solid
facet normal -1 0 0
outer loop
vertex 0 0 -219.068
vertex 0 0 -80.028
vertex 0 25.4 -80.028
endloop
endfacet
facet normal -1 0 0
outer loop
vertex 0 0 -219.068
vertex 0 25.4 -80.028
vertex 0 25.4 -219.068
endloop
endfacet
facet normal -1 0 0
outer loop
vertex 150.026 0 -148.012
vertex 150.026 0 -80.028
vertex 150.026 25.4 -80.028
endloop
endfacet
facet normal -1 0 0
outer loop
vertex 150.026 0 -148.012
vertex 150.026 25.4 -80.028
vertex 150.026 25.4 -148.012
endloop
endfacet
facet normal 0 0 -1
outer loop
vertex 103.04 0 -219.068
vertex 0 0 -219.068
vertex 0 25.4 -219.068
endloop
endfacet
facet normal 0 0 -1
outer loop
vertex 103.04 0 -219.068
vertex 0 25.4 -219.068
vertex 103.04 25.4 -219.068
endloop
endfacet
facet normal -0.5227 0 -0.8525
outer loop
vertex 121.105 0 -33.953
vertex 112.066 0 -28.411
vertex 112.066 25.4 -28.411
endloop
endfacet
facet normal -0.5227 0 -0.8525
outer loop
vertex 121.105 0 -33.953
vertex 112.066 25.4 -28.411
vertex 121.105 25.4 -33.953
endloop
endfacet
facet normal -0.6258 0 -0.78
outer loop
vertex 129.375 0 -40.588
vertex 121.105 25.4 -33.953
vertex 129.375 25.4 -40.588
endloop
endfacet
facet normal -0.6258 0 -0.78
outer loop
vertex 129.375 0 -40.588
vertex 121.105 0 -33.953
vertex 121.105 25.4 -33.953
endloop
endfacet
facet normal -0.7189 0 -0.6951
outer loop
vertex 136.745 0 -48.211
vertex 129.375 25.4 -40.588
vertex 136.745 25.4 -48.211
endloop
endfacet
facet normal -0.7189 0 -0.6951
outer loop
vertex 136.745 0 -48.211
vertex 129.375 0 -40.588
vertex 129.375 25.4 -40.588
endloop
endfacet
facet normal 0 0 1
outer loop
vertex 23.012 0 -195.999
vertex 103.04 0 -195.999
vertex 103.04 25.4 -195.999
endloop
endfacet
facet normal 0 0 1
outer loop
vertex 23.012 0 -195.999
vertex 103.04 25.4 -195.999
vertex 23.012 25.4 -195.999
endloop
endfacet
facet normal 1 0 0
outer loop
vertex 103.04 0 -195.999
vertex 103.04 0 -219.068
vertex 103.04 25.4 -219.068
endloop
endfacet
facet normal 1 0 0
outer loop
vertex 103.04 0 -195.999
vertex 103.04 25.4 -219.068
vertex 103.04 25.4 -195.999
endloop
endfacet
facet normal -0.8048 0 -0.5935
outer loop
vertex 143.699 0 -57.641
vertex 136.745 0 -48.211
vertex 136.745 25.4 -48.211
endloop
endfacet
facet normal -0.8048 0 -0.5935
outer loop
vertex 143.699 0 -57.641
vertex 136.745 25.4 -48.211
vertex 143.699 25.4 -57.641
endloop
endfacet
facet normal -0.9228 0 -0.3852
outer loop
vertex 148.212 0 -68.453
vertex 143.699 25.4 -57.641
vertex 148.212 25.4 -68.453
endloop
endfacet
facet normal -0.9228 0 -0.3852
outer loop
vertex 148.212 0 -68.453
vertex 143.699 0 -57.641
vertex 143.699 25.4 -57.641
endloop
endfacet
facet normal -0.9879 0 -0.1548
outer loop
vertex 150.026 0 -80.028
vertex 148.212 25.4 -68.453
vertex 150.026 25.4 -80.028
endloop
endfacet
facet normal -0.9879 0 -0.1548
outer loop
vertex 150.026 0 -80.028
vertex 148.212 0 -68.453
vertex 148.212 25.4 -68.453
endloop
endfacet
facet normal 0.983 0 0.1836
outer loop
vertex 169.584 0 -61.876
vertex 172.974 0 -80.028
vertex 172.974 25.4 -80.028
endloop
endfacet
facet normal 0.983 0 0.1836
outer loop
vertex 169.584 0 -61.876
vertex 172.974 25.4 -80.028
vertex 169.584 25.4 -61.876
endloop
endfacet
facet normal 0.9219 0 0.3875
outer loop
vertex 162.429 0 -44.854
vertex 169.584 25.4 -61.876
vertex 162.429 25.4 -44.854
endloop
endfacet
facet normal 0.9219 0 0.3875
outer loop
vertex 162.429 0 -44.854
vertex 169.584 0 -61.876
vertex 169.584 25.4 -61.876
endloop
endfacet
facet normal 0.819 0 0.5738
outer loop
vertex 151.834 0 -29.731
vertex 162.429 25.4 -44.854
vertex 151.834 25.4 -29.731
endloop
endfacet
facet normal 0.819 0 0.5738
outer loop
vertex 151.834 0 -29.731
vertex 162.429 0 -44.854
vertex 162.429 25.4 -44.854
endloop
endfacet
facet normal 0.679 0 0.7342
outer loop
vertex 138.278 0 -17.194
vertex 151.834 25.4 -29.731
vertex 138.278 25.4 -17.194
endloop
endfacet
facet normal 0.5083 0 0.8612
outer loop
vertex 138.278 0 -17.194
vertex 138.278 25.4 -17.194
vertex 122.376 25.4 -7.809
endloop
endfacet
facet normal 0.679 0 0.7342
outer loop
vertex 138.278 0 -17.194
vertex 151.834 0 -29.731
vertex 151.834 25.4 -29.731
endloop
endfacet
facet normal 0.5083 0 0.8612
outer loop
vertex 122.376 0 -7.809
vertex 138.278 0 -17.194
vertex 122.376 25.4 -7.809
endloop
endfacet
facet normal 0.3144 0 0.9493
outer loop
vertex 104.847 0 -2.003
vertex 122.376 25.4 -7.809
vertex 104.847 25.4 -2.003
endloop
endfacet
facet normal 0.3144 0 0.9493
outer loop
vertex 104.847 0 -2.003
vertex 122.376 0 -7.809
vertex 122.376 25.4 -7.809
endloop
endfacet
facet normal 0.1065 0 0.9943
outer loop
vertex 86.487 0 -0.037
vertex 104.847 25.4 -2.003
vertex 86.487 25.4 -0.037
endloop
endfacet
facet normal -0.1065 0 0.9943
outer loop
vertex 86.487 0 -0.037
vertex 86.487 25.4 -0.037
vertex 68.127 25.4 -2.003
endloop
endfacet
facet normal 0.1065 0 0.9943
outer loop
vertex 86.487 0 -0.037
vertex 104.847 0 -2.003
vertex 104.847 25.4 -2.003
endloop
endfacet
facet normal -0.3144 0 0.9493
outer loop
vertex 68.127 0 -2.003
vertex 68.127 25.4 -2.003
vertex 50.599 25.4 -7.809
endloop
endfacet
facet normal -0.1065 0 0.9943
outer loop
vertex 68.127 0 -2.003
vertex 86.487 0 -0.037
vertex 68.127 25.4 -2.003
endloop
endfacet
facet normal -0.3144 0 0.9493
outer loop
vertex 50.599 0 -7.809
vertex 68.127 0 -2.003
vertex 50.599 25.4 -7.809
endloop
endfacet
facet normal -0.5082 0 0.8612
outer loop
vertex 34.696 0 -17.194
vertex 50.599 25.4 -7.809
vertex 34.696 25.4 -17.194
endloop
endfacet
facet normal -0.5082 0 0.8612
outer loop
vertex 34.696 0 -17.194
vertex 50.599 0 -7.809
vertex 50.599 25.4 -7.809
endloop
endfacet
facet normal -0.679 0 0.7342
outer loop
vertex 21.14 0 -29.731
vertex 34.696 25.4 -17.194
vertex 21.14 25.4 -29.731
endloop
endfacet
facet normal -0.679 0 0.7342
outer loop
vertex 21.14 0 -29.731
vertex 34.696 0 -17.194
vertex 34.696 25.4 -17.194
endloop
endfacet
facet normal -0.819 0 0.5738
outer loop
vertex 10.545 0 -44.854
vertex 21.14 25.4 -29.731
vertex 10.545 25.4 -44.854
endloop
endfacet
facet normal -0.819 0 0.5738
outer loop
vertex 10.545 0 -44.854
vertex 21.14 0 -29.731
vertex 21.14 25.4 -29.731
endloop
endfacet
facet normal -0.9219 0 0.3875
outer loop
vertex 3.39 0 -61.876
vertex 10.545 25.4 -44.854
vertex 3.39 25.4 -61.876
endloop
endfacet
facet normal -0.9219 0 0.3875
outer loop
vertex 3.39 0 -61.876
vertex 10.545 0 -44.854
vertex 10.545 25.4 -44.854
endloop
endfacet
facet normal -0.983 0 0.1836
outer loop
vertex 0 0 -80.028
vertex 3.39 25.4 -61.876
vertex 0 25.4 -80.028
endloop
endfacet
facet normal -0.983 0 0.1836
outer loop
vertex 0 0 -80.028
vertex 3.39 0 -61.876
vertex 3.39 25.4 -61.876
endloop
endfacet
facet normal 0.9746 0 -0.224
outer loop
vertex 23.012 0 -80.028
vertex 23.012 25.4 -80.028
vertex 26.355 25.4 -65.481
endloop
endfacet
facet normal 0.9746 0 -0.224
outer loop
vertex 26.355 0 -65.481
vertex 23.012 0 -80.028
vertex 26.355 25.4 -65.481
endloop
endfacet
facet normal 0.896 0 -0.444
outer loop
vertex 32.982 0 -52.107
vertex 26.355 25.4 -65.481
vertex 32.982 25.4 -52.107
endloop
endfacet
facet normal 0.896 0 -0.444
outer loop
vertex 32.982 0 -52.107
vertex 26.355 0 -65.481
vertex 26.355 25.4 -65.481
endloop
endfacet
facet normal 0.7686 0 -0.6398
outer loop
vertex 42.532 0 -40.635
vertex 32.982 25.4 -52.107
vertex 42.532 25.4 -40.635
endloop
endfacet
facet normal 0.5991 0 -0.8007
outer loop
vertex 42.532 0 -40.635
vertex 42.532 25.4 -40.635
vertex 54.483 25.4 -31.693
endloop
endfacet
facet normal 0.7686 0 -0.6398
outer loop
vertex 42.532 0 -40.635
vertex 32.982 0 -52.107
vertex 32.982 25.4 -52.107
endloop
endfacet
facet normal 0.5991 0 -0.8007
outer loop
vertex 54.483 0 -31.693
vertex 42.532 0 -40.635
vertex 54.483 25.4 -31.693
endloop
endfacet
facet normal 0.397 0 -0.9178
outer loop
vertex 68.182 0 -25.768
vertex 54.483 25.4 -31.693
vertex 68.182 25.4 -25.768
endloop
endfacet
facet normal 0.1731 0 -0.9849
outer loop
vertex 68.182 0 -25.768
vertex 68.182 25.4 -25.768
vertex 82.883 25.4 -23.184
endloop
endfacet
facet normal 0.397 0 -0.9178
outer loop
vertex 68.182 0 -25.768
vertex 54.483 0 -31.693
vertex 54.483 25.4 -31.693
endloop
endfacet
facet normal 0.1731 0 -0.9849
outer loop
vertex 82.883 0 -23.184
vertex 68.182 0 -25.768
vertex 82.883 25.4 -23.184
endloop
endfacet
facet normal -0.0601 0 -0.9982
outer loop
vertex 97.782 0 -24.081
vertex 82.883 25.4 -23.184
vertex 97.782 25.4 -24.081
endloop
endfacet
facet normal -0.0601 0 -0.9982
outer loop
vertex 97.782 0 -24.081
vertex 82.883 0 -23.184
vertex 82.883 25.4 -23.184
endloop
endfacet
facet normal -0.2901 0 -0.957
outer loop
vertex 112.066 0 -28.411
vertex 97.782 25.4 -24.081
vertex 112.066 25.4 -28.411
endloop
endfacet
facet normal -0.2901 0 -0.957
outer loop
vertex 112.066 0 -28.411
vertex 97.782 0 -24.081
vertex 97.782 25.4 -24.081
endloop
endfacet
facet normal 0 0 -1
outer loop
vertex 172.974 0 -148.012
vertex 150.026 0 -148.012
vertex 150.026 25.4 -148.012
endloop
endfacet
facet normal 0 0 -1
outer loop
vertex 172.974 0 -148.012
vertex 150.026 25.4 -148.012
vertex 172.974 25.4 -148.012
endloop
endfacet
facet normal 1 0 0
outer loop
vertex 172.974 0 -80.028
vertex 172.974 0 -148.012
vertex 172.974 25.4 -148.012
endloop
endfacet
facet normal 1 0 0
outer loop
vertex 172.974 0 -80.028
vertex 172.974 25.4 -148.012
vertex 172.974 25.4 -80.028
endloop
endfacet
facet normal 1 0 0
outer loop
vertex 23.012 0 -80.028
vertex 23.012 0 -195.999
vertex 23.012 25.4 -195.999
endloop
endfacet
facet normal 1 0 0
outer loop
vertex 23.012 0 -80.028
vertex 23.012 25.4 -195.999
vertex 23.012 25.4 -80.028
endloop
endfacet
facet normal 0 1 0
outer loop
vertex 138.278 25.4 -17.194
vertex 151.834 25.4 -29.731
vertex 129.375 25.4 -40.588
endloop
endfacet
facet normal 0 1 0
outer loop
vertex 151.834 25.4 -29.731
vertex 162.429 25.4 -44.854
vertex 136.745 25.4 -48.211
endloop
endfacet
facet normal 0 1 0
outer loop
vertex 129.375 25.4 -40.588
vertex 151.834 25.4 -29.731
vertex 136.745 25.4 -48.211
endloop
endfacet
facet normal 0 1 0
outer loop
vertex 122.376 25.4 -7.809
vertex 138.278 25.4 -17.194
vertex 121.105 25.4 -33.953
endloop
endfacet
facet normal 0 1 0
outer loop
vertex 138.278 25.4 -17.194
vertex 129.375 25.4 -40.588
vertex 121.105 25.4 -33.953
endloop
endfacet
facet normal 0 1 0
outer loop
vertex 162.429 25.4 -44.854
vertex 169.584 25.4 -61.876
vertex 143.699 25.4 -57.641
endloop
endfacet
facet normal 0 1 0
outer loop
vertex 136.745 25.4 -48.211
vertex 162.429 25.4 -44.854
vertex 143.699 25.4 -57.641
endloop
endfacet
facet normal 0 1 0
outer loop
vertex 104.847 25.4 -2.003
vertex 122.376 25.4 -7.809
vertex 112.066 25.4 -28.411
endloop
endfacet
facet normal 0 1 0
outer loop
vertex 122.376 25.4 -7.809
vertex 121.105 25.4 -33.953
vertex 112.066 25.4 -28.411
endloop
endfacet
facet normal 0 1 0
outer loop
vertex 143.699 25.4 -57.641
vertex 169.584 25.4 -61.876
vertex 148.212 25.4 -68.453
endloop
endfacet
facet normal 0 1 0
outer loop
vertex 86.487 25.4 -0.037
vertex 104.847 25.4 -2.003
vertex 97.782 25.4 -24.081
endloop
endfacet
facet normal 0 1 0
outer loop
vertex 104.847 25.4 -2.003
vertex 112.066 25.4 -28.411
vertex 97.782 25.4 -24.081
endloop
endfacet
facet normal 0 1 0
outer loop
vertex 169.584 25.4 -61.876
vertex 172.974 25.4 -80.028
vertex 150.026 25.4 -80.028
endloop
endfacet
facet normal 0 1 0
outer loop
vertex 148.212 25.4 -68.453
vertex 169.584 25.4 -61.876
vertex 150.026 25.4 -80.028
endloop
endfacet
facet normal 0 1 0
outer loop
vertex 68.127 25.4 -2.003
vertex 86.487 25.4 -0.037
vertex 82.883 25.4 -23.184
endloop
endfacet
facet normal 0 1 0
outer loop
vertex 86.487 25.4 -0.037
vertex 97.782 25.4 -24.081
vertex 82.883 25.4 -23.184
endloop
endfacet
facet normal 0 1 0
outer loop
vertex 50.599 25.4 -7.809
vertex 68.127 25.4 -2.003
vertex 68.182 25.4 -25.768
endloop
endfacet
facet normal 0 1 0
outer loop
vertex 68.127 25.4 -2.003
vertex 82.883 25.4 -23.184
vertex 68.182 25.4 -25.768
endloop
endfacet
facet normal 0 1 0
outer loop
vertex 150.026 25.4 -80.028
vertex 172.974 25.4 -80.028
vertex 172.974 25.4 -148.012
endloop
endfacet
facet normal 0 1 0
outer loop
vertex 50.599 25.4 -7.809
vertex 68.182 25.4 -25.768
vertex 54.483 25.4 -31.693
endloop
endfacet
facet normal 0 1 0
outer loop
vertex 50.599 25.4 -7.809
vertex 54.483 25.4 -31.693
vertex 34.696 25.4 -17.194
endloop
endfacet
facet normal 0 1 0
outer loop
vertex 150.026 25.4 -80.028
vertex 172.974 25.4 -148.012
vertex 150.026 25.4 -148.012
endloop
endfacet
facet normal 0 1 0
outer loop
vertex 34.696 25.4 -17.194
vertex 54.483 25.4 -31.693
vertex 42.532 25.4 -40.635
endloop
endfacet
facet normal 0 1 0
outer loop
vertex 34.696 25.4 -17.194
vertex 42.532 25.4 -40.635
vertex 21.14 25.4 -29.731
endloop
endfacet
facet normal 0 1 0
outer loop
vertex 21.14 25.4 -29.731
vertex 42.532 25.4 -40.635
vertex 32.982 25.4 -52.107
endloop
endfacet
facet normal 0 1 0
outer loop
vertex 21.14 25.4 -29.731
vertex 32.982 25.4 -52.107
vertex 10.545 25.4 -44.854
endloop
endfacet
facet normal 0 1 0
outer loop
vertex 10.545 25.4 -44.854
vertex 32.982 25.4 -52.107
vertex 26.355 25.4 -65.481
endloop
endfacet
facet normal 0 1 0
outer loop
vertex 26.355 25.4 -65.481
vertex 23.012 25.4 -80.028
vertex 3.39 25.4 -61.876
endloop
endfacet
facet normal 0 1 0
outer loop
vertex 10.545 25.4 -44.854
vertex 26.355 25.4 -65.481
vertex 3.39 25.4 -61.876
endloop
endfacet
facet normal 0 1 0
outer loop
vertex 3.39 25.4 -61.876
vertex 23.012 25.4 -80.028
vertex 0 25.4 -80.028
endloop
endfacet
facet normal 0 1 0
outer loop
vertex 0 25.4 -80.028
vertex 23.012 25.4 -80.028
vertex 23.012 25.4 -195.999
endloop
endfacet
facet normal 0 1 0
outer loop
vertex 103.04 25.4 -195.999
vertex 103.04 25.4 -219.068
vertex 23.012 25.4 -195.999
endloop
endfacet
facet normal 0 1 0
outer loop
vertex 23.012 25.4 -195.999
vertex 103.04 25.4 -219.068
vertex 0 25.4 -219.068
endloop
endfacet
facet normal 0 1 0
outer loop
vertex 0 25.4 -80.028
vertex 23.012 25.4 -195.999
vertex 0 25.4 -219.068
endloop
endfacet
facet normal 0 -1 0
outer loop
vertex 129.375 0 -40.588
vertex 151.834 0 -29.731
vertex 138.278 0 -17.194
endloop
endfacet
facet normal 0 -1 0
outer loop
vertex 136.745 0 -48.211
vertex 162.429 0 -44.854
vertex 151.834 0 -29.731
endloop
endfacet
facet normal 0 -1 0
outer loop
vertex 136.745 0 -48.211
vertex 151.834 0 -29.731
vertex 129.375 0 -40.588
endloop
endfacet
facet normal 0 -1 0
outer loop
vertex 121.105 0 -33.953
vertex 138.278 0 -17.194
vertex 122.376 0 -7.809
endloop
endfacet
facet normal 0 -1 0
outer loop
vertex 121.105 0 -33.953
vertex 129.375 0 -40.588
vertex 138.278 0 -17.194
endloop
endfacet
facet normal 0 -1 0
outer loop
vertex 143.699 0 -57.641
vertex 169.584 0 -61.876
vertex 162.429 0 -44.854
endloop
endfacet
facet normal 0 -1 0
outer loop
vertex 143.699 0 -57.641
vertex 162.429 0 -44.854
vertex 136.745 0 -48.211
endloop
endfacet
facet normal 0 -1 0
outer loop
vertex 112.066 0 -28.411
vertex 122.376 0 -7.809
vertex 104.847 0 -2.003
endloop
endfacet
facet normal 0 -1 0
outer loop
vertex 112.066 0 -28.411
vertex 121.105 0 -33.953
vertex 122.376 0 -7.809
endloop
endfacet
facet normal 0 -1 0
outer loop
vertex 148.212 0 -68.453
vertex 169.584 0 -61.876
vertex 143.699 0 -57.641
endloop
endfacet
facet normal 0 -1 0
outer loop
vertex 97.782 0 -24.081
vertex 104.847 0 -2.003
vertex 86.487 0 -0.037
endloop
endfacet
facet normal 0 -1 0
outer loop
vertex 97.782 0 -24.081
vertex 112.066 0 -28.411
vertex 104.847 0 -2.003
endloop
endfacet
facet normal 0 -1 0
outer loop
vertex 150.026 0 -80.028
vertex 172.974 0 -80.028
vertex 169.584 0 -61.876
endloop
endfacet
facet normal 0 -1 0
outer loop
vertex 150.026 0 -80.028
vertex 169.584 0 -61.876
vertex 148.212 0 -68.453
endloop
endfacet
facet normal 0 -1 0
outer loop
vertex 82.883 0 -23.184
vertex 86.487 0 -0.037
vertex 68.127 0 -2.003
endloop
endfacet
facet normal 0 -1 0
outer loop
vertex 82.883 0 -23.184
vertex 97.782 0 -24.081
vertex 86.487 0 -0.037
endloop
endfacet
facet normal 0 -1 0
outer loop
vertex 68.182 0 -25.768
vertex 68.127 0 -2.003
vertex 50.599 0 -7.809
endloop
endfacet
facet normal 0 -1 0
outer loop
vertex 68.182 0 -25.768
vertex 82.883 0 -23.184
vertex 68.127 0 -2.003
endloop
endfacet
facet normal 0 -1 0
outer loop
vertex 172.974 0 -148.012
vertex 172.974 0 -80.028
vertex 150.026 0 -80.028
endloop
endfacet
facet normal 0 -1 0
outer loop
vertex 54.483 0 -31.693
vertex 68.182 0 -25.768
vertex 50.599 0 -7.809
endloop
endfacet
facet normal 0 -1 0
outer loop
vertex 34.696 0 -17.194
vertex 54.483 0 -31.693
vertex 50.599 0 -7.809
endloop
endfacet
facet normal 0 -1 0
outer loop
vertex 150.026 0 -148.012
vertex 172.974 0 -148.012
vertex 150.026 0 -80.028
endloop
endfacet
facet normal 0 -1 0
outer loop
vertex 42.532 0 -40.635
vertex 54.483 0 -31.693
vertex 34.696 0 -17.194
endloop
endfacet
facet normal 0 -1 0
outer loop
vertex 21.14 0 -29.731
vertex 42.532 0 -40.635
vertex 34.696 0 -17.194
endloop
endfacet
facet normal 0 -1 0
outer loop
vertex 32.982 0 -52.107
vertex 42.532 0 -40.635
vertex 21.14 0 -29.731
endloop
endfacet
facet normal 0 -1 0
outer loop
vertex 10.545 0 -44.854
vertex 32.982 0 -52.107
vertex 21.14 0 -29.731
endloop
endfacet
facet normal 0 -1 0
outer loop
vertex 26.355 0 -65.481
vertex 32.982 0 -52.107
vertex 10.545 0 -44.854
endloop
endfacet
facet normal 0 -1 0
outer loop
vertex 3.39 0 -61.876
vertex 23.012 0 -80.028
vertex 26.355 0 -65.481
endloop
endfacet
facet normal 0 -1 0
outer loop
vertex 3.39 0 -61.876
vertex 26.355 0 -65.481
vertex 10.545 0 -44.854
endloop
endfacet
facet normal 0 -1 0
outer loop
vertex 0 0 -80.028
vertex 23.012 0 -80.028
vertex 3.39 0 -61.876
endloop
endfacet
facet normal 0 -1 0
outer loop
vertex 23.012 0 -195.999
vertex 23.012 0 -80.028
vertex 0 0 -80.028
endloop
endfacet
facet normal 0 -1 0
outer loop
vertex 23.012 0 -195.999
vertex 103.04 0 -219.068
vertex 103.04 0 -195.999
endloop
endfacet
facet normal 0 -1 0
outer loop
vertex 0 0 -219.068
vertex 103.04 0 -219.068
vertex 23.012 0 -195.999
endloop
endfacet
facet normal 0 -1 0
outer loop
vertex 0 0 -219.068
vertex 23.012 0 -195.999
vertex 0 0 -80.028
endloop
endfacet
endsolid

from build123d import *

# Parameters (mm, degrees)
BOSS_EXTRUDE1_DEPTH     = 25.4
BOSS_EXTRUDE1_2_DEPTH   = 25.4
CUT_EXTRUDE1_DEPTH      = 281.867791968
CUT_EXTRUDE1_DEPTH_BACK = 281.867791968
SKETCH2_W               = 46.910236734
SKETCH2_H               = 46.937556504
CUT_EXTRUDE2_DEPTH      = 281.278275978
CUT_EXTRUDE2_DEPTH_BACK = 281.278275978


with BuildPart() as part:
    # Sketch1 → Boss-Extrude1 (new body)
    with BuildSketch(Plane(origin=(0, 0, 0), x_dir=(1, 0, 0), z_dir=(0, 1, 0))):
        with BuildLine():
            Line((0, 80.02759766), (0, 219.067642019))
            Line((0, 219.067642019), (103.040086398, 219.067642019))
            Line((103.040086398, 219.067642019), (103.040086398, 195.999460881))
            Line((103.040086398, 195.999460881), (23.011829096, 195.999460881))
            Line((23.011829096, 195.999460881), (23.011829096, 161.013213822))
            ThreePointArc((23.011829096, 161.013213822), (101.985495584, 126.901824422), (136.744902109, 48.211224327))
            ThreePointArc((136.744902109, 48.211224327), (146.280346481, 62.911008862), (150.026111113, 80.02759766))
            Line((150.026111113, 80.02759766), (150.026111113, 148.011746996))
            Line((150.026111113, 148.011746996), (172.974333949, 148.011746996))
            Line((172.974333949, 148.011746996), (172.974333949, 80.02759766))
            ThreePointArc((172.974333949, 80.02759766), (86.487166974, 0.037389651), (0, 80.02759766))
        make_face()
        with BuildLine():
            Line((23.011829096, 136.058182002), (23.011829096, 80.02759766))
            ThreePointArc((23.011829096, 80.02759766), (54.48283159, 31.69310754), (112.066438029, 28.410547154))
            ThreePointArc((112.066438029, 28.410547154), (90.841729512, 101.512108787), (23.011829096, 136.058182002))
        make_face(mode=Mode.SUBTRACT)
    extrude(amount=BOSS_EXTRUDE1_DEPTH)

    # Sketch3 → Cut-Extrude2 (cut, two sides: drawn at the far end of the back side and taken through both)
    with BuildSketch(Plane(origin=(0, 25.4, 0), x_dir=(1, 0, 0), z_dir=(0, 1, 0)).offset(-CUT_EXTRUDE2_DEPTH_BACK)):
        with BuildLine():
            Line((23.011829096, 161.013213822), (23.011829096, 136.058182002))
            ThreePointArc((23.011829096, 136.058182002), (90.841729512, 101.512108787), (112.066438029, 28.410547154))
            ThreePointArc((112.066438029, 28.410547154), (125.345033885, 37.140114863), (136.744902109, 48.211224327))
            ThreePointArc((136.744902109, 48.211224327), (101.985495584, 126.901824422), (23.011829096, 161.013213822))
        make_face()
    extrude(amount=CUT_EXTRUDE2_DEPTH + CUT_EXTRUDE2_DEPTH_BACK, mode=Mode.SUBTRACT)


with BuildPart() as body_2:
    # Sketch1 → Boss-Extrude1 2 (new body)
    with BuildSketch(Plane(origin=(0, 0, 0), x_dir=(1, 0, 0), z_dir=(0, 1, 0))):
        Polygon((173.927929859, 172.130085515), (150.026111113, 172.130085515), (150.026111113, 195.999460881), (127.017693125, 195.999460881), (127.017693125, 219.067642019), (173.927929859, 219.067642019), align=None)
    extrude(amount=BOSS_EXTRUDE1_2_DEPTH)

    # Sketch2 → Cut-Extrude1 (cut, two sides: drawn at the far end of the back side and taken through both)
    with BuildSketch(Plane(origin=(0, 25.4, 0), x_dir=(1, 0, 0), z_dir=(0, 1, 0)).offset(-CUT_EXTRUDE1_DEPTH_BACK)):
        with Locations((150.472811492, 195.598863767)):
            Rectangle(SKETCH2_W, SKETCH2_H)
    extrude(amount=CUT_EXTRUDE1_DEPTH + CUT_EXTRUDE1_DEPTH_BACK, mode=Mode.SUBTRACT)


solid = part.part
